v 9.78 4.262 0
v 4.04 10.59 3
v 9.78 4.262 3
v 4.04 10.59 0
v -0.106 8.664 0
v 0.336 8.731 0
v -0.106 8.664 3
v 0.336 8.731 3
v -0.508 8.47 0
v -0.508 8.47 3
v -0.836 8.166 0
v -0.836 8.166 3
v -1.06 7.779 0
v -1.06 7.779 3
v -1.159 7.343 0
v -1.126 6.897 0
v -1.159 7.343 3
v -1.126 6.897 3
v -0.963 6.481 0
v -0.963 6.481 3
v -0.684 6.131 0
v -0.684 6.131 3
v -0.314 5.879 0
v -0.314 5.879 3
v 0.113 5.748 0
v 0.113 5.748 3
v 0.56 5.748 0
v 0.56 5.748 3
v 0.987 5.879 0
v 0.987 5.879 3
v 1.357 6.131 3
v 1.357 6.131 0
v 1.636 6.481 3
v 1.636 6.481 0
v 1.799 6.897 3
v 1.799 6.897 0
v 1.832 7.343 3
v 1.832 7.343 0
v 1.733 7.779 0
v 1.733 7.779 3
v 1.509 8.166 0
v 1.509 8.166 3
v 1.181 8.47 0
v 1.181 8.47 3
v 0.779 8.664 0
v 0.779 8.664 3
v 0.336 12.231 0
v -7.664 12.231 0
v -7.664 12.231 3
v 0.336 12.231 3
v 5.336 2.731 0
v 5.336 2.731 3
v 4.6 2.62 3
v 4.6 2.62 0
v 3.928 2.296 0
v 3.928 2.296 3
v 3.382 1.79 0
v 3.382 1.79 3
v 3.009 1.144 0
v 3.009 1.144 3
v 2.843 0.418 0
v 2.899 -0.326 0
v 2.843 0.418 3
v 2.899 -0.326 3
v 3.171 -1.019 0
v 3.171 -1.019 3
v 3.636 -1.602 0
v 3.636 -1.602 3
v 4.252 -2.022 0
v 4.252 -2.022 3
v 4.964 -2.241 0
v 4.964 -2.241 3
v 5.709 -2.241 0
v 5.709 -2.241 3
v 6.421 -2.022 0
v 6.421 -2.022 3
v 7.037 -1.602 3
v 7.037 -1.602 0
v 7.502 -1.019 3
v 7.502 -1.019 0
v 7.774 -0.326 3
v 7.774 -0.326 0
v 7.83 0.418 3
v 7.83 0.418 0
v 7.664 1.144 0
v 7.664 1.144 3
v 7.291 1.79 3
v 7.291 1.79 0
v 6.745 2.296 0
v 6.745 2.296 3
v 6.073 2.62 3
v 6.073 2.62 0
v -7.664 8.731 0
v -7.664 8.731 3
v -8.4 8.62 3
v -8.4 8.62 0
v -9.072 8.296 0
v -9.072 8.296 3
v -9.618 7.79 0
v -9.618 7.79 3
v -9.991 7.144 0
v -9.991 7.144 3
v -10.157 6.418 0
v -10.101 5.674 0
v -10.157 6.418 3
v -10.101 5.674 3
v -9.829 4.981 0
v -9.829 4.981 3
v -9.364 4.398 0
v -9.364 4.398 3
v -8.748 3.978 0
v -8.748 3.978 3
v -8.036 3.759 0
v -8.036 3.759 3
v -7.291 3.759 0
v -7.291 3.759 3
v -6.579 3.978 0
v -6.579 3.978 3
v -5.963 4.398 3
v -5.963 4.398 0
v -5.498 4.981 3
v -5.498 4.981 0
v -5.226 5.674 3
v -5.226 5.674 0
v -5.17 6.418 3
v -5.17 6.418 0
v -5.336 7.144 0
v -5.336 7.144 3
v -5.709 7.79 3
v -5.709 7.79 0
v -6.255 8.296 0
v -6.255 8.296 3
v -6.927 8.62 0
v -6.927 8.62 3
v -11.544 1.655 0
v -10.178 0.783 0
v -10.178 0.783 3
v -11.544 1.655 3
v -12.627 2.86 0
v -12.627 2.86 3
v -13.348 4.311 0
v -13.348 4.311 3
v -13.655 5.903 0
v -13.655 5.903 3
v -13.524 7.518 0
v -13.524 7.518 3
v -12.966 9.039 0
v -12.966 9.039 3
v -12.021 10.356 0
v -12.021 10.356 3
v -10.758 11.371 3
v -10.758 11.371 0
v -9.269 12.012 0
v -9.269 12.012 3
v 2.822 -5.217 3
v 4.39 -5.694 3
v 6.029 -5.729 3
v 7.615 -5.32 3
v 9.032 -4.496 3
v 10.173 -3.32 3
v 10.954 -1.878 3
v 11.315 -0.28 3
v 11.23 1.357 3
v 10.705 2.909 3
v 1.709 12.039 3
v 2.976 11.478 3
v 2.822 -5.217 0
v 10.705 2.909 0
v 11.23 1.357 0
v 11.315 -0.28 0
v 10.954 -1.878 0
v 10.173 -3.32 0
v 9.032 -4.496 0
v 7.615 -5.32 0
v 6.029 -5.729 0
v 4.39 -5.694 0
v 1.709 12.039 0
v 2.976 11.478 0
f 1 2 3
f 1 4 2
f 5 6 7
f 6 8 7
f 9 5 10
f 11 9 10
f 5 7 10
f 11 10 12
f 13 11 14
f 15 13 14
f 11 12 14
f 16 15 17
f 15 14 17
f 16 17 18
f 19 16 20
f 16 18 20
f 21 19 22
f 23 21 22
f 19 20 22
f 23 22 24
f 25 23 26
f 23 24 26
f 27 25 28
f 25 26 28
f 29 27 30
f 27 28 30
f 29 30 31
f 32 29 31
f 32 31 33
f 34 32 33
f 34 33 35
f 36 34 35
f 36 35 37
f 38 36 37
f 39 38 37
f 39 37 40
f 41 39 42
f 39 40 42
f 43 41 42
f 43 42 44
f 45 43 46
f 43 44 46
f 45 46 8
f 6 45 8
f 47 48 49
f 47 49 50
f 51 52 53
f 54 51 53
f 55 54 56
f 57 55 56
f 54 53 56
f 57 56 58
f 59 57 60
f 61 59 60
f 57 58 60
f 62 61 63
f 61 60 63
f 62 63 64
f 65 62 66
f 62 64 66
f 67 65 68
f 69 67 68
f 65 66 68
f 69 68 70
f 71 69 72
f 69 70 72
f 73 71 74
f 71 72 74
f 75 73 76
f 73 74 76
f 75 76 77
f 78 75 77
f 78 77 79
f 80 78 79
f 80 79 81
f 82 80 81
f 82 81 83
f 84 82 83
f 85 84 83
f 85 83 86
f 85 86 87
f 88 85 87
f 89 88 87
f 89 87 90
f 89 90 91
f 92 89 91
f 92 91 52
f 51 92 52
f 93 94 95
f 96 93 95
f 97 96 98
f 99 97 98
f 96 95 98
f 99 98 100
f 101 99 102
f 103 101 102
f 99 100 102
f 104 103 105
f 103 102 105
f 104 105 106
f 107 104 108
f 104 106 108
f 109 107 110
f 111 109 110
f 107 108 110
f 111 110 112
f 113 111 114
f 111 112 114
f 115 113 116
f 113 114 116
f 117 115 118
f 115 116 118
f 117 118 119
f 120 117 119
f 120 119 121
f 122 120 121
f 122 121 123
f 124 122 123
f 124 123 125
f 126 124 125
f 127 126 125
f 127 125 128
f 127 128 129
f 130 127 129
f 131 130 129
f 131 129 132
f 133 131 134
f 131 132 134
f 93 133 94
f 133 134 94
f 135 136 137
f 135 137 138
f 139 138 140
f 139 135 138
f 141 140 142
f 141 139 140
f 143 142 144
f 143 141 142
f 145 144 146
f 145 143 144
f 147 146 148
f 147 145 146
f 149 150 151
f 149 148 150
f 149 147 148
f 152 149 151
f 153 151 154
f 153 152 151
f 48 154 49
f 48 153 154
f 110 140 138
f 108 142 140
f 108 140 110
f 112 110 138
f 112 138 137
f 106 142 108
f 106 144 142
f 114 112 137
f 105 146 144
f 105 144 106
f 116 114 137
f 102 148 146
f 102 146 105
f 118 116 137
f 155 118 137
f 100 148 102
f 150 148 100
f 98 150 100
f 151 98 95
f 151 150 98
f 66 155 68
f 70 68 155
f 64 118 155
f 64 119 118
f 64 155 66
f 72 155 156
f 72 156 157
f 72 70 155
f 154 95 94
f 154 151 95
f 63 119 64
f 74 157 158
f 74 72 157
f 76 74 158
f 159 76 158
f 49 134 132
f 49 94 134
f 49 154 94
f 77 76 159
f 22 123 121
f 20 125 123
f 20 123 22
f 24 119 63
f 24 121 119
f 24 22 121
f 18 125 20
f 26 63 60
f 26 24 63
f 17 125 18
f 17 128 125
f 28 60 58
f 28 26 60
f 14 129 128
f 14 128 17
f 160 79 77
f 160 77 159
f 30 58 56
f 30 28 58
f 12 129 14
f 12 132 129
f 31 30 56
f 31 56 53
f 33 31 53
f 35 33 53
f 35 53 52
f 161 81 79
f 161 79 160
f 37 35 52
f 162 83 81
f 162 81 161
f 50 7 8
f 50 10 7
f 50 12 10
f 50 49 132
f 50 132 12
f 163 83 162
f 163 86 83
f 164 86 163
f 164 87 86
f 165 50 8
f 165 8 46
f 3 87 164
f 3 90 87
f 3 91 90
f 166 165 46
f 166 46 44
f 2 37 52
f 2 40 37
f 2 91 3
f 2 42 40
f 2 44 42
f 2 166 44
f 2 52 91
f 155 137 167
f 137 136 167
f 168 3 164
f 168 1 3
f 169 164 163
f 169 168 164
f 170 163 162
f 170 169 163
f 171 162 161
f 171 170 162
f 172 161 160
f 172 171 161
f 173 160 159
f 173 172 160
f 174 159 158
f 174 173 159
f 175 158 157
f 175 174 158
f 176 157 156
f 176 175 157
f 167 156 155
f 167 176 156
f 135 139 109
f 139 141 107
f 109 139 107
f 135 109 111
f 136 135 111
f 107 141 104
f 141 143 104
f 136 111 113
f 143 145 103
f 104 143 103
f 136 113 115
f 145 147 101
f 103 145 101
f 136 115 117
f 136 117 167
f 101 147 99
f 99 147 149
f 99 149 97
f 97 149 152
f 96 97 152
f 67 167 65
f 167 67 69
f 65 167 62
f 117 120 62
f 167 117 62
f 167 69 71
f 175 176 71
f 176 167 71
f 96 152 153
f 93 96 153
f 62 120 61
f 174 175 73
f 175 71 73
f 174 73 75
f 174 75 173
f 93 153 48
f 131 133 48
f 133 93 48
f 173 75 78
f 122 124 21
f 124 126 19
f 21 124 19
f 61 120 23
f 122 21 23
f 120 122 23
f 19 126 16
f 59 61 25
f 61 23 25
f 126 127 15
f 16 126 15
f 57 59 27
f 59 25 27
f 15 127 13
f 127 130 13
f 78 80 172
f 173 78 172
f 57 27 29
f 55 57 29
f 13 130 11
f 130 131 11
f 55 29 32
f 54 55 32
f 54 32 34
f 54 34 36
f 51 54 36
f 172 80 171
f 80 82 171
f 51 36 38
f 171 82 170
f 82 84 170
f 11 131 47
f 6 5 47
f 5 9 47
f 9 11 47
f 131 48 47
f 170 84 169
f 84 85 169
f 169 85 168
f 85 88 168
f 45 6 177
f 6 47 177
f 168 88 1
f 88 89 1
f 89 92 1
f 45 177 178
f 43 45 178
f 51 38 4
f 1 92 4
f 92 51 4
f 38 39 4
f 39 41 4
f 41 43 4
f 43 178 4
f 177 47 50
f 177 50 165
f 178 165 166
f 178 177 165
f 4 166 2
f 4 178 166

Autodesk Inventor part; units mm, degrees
ref_plane "YZ Plane" through (0, 0, 0) normal (1, 0, 0) x (0, 1, 0)
ref_plane "XZ Plane" through (0, 0, 0) normal (0, 1, 0) x (-1, 0, 0)
ref_plane "XY Plane" through (0, 0, 0) normal (0, 0, 1) x (1, 0, 0)
sketch "Szkic1" plane through (0, 0, 0) normal (0, 0, 1) x (1, 0, 0)
  circle A0 centre (0.3365, 7.2308) radius 5
  circle A1 centre (-7.6635, 6.2308) radius 6
  circle A2 centre (5.3365, 0.2308) radius 6
  line L0 (-7.6635, 12.2308) -> (0.3365, 12.2308)
  line L1 (4.0398, 10.5902) -> (9.7804, 4.2621)
  line L2 (-10.1778, 0.783) -> (2.8222, -5.217)
  point P0 (0, 0)
  dimension "d0" = 13
  dimension "d1" = 6
  dimension "d2" = 7
  dimension "d3" = 5
  dimension "d4" = 10
  dimension "d5" = 12
  dimension "d6" = 12
extrude "Wyciągnięcie proste1" add sketch "Szkic1" along normal blind 3
hole "Otwór1" at (5.3365, 0.2308, 0) at (-7.6635, 6.2308, 0) direction (0, 0, 1) diameter 5 end through all
hole "Otwór2" at (0.3365, 7.2308, 0) direction (0, 0, 1) diameter 3 end through all
properties part number "mocowanie_sprezyny"
